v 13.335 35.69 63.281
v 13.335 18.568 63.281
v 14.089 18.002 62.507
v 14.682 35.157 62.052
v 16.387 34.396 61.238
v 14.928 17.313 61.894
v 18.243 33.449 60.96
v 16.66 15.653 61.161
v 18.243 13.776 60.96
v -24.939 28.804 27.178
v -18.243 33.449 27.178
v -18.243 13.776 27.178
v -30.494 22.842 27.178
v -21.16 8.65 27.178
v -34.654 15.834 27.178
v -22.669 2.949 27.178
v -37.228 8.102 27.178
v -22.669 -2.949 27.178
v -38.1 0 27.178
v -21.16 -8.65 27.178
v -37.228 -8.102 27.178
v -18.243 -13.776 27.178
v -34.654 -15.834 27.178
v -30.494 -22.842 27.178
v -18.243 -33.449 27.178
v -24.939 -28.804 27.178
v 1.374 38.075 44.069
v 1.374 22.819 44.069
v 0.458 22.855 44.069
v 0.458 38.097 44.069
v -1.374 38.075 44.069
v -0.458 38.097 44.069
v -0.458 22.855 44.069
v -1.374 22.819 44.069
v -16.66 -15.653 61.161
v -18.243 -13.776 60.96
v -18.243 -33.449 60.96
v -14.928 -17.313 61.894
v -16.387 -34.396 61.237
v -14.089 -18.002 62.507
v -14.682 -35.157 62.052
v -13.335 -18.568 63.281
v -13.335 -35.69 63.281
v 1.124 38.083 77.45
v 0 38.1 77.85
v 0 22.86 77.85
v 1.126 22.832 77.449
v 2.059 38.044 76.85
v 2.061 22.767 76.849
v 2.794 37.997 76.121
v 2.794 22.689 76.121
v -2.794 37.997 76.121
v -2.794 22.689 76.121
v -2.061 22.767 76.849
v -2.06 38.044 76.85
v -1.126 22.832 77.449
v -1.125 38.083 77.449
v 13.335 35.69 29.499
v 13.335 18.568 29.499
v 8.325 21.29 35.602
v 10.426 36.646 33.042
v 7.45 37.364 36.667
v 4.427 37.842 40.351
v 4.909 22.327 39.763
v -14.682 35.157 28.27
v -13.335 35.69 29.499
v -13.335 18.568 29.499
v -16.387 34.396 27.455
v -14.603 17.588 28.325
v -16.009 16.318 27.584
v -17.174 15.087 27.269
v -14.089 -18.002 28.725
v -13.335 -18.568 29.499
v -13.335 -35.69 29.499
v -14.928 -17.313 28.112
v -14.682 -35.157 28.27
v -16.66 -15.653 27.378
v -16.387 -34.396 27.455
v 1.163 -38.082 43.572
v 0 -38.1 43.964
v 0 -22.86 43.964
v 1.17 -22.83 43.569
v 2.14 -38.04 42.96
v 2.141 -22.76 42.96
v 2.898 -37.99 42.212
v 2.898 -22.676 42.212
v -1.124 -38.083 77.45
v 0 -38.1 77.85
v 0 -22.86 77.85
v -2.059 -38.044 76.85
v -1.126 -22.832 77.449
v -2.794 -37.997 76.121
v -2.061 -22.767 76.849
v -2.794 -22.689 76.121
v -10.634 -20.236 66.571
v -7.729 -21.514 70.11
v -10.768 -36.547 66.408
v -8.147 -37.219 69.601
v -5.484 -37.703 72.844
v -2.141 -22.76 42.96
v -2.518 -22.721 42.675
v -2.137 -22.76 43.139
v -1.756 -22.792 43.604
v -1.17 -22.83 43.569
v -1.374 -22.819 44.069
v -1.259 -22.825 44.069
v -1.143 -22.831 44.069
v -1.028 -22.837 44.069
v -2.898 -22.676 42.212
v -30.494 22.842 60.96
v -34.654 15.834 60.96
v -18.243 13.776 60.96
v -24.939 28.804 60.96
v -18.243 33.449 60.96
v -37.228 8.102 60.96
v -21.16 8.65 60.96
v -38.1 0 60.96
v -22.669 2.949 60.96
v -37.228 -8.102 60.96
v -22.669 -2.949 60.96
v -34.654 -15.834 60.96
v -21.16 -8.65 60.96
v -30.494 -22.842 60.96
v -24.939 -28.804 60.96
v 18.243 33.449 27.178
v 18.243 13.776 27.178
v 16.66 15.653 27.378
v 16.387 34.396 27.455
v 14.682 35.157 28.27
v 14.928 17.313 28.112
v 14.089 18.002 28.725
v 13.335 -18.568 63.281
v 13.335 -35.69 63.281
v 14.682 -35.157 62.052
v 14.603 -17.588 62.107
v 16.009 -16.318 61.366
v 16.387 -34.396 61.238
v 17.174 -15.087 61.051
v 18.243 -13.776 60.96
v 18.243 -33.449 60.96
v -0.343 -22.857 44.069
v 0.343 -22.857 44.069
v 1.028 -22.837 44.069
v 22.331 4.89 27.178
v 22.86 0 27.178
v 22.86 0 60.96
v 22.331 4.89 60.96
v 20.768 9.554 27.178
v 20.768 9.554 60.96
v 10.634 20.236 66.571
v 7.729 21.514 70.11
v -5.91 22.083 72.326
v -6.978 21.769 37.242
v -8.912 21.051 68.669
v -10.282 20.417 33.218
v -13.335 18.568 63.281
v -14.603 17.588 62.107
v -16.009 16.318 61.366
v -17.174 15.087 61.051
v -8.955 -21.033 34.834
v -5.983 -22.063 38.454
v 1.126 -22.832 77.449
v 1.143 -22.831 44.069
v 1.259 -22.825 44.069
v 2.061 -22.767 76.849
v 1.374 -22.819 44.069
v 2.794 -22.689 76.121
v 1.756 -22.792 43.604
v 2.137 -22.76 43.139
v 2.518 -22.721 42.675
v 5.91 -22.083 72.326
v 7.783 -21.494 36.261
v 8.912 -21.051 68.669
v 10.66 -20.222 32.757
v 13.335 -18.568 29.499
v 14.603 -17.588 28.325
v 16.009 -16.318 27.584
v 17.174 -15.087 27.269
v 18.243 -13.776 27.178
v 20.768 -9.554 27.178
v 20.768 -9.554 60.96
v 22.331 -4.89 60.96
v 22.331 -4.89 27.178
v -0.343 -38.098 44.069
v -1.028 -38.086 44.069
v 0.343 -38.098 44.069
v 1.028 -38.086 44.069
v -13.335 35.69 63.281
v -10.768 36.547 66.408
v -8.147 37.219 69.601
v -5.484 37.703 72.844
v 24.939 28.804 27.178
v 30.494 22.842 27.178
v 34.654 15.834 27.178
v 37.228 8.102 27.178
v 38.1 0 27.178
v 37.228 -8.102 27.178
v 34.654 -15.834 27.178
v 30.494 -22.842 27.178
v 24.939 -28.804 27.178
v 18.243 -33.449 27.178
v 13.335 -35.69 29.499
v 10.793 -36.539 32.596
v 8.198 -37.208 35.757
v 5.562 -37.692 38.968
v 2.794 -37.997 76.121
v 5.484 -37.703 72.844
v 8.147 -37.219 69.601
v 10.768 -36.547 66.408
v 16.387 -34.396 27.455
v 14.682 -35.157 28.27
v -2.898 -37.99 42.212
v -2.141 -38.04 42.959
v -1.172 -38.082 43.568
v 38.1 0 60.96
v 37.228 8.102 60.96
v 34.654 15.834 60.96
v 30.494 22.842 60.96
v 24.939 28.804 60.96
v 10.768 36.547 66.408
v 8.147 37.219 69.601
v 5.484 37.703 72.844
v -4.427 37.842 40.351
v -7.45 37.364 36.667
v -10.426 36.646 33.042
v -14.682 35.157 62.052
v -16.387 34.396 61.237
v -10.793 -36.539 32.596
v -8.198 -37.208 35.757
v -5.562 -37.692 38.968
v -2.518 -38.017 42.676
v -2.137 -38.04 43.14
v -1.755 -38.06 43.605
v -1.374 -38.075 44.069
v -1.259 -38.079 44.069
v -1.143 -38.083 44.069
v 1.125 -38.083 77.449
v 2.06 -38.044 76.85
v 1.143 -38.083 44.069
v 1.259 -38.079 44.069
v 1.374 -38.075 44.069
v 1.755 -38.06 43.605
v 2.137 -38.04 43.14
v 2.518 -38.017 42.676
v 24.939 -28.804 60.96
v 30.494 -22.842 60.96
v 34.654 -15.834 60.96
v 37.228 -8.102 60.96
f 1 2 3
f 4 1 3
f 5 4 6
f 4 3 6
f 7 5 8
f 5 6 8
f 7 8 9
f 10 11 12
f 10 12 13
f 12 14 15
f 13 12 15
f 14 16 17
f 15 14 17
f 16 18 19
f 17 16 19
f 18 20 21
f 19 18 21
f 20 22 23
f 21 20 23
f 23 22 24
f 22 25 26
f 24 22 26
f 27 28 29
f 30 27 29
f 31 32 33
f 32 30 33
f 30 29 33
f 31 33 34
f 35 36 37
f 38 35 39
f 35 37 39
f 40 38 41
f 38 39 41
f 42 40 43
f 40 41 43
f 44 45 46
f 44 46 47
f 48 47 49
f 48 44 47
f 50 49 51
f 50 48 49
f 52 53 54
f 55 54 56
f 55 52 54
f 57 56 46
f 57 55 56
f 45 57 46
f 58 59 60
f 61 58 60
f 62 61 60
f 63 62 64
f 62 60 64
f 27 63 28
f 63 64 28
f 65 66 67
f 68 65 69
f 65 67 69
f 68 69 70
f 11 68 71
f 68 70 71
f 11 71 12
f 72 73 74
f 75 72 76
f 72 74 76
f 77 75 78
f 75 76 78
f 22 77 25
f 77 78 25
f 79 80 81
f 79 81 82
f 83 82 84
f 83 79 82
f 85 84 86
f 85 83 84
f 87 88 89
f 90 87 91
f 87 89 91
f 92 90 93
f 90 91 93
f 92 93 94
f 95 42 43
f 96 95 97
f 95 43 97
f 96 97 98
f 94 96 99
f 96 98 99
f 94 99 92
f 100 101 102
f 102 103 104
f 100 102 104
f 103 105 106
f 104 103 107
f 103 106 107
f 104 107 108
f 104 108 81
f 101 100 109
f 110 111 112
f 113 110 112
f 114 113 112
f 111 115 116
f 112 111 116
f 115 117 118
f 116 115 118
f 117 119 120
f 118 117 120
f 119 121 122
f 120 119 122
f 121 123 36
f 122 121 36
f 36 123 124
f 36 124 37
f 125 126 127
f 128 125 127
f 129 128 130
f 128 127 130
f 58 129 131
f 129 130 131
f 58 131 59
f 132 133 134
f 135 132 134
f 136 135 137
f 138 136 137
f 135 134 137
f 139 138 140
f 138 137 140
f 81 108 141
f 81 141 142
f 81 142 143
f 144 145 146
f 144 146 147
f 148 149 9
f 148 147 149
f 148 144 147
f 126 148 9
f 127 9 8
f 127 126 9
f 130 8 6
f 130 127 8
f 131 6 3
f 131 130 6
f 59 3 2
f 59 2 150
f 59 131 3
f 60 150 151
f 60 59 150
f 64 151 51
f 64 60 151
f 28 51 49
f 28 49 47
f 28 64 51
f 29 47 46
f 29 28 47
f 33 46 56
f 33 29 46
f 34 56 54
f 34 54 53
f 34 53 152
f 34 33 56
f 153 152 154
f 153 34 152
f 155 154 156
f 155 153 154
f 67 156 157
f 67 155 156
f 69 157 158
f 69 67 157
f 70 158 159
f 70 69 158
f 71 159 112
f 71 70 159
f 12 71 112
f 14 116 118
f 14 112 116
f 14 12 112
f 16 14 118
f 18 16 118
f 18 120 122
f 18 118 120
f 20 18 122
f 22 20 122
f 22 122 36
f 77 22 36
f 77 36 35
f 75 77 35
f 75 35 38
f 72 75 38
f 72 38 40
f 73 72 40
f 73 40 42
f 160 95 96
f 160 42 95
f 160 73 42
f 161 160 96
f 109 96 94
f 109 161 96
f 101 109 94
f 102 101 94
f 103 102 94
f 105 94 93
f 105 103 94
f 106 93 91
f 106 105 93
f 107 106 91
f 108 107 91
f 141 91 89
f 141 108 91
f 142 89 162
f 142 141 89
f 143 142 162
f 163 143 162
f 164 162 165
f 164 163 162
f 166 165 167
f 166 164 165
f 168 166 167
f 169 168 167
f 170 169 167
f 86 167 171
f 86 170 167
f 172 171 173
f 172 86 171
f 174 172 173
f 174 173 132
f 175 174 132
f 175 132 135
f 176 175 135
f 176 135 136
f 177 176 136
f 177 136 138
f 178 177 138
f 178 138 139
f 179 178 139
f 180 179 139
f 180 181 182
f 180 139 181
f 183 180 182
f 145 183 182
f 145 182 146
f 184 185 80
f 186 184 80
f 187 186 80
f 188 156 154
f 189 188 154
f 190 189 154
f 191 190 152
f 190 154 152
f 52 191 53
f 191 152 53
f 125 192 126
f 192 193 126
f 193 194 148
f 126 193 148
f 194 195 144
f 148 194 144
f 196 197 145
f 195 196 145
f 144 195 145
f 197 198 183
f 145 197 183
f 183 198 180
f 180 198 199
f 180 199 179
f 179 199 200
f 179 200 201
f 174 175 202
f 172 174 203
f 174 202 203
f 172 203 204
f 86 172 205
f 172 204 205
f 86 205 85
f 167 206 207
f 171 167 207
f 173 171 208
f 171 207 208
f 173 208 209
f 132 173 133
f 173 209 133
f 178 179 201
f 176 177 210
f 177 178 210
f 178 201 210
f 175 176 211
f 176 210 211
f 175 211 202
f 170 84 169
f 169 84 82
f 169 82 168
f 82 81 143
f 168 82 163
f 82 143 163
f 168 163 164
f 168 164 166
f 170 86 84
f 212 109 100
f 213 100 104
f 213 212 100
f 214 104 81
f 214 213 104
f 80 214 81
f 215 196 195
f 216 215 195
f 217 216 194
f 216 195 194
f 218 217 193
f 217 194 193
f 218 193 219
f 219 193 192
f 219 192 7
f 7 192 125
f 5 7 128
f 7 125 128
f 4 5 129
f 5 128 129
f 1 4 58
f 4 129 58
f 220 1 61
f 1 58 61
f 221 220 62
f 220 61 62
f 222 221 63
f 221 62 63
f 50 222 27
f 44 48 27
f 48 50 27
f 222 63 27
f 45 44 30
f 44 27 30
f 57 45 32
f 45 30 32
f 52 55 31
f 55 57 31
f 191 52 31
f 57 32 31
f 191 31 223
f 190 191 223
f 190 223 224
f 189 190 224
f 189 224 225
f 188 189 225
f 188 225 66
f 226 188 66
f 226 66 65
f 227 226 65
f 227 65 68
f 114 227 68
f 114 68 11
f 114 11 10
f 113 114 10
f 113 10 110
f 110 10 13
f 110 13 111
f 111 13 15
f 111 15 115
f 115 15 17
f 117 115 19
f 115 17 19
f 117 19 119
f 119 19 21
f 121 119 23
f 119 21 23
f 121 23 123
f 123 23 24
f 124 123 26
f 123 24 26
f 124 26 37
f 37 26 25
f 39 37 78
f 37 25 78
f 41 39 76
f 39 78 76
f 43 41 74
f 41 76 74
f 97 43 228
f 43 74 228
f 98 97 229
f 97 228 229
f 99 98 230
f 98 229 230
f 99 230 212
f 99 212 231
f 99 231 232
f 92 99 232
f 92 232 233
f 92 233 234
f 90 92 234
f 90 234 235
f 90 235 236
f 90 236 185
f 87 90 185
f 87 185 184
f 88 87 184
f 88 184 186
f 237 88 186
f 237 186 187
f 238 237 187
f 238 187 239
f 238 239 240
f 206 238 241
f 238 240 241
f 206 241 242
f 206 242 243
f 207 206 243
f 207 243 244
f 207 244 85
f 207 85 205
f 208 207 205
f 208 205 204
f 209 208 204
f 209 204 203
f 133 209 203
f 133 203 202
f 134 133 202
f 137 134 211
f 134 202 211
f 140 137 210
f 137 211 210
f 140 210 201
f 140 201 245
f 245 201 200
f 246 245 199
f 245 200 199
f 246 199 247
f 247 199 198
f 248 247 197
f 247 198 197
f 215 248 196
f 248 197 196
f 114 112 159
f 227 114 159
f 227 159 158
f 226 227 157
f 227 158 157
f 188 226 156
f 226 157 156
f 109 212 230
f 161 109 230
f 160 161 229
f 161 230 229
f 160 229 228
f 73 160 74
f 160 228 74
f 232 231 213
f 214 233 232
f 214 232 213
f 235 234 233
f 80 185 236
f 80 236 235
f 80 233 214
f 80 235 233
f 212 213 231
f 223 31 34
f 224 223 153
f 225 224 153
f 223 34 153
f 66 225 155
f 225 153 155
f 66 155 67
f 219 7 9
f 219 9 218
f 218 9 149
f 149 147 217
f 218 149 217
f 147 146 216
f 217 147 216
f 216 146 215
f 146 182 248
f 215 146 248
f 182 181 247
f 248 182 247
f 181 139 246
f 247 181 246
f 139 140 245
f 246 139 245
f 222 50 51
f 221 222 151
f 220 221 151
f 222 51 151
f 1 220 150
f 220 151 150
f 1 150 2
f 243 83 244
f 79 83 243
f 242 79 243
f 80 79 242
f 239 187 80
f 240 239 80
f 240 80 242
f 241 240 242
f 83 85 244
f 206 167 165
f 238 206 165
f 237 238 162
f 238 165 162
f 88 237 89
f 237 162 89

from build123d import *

# Parameters (mm, degrees)
F0_R         = 38.1
F0_R_2       = 22.86
F1_DEPTH     = 127
F4_DEPTH     = 80.011
F5_T4_DEPTH  = 27.2677982704
F5_S5_R      = 38.1
F5_T6_DEPTH  = 15
F5_S7_R      = 22.86
F5_T8_DEPTH  = 15
F5_T12_DEPTH = 27.2677982704
F5_S13_R     = 38.1
F5_T14_DEPTH = 15
F5_S15_R     = 22.86
F5_T16_DEPTH = 15
F5_T17_DEPTH = 27.2653813946
F5_T19_DEPTH = 27.2653813946


# Not quite as in the source:
# - a fillet or chamfer that OpenCascade refuses, or shapes differently, is made with other operations: its cross-section is extruded or revolved along the edge and cut away or added


with BuildPart() as f1:
    # F0 (on Top) → F1 (new body)
    with BuildSketch(Plane.XY):
        Circle(F0_R)
        Circle(F0_R_2, mode=Mode.SUBTRACT)
    extrude(amount=F1_DEPTH)

    # F3 (on offset) → F4 (cut, through all)
    with BuildSketch(Plane.XZ.offset(41.91)):
        with BuildLine():
            Line((1.3741332924, 44.0691516455), (0, 44.0691516455))
            Line((0, 44.0691516455), (0, 27.1781024958))
            Line((0, 27.1781024958), (0, -6.6039958037))
            Line((0, -6.6039958037), (38.1, -6.6039958037))
            Line((38.1, -6.6039958037), (38.1, 27.1781024958))
            Line((38.1, 27.1781024958), (18.242812226, 27.1781024958))
            ThreePointArc((18.242812226, 27.1781024958), (15.5282171859, 27.7875908663), (13.3347289514, 29.4990556395))
            Line((13.3347289514, 29.4990556395), (1.3741332924, 44.0691516455))
        make_face()
        with BuildLine():
            Line((0, 44.0691516455), (-1.3741332924, 44.0691516455))
            Line((-1.3741332924, 44.0691516455), (-13.3347289514, 29.4990556395))
            ThreePointArc((-13.3347289514, 29.4990556395), (-15.5282171859, 27.7875908663), (-18.242812226, 27.1781024958))
            Line((-18.242812226, 27.1781024958), (-38.1, 27.1781024958))
            Line((-38.1, 27.1781024958), (-38.1, -6.6039958037))
            Line((-38.1, -6.6039958037), (0, -6.6039958037))
            Line((0, -6.6039958037), (0, 27.1781024958))
            Line((0, 27.1781024958), (0, 44.0691516455))
        make_face()
        with BuildLine():
            Line((38.1, 60.9602007953), (38.1, 77.9781024958))
            Line((38.1, 77.9781024958), (1.27, 77.9781024958))
            Line((1.27, 77.9781024958), (1.2895432809, 77.9542953638))
            Line((1.2895432809, 77.9542953638), (13.3347289514, 63.281153939))
            ThreePointArc((13.3347289514, 63.281153939), (15.5282171859, 61.5696891658), (18.242812226, 60.9602007953))
            Line((18.242812226, 60.9602007953), (38.1, 60.9602007953))
        make_face()
        with BuildLine():
            Line((-38.1, 77.9781024958), (-38.1, 60.9602007953))
            Line((-38.1, 60.9602007953), (-18.242812226, 60.9602007953))
            ThreePointArc((-18.242812226, 60.9602007953), (-15.5282171859, 61.5696891658), (-13.3347289514, 63.281153939))
            Line((-13.3347289514, 63.281153939), (-1.2895432809, 77.9542953638))
            Line((-1.2895432809, 77.9542953638), (-1.27, 77.9781024958))
            Line((-1.27, 77.9781024958), (-38.1, 77.9781024958))
        make_face()
        Polygon((-38.1, 131.2988996506), (-38.1, 77.9781024958), (-1.27, 77.9781024958), (-1.2391987117, 77.9781024958), (-0.1262114529, 77.9781024958), (0, 77.9781024958), (1.2391987117, 77.9781024958), (1.27, 77.9781024958), (38.1, 77.9781024958), (38.1, 80.6030047561), (38.1, 131.2988996506), align=None)
    extrude(amount=-F4_DEPTH, mode=Mode.SUBTRACT)

    # F5: fillet of radius 5.08 on 6 edges, made by hand


with BuildPart() as f5_tool2:
    # F5_s3 → F5_t4 (new body)
    with BuildSketch(Plane.XZ.offset(44.0808363055)):
        with BuildLine():
            ThreePointArc((-1.0281164884, 44.0691516455), (1.1435595437, 43.5815609491), (2.8983501313, 42.2123891305))
            Line((2.8983501313, 42.2123891305), (1.3741332924, 44.0691516455))
            Line((1.3741332924, 44.0691516455), (-1.0281164884, 44.0691516455))
        make_face()
    extrude(amount=-F5_T4_DEPTH)

    # F5_s5 → F5_t6 (intersect, symmetric)
    with BuildSketch(Plane.XY.offset(43.1)):
        Circle(F5_S5_R)
    extrude(amount=F5_T6_DEPTH, both=True, mode=Mode.INTERSECT)

    # F5_s7 → F5_t8 (cut, symmetric)
    with BuildSketch(Plane.XY.offset(43.1)):
        Circle(F5_S7_R)
    extrude(amount=F5_T8_DEPTH, both=True, mode=Mode.SUBTRACT)


with BuildPart() as f1_1:
    add(f1.part)

    # F5_t1: union F5_tool2
    add(f5_tool2.part)


with BuildPart() as f5_tool10:
    # F5_s11 → F5_t12 (new body)
    with BuildSketch(Plane.XZ.offset(44.0808363055)):
        with BuildLine():
            ThreePointArc((-2.8983501313, 42.2123891305), (-1.1435595437, 43.5815609491), (1.0281164884, 44.0691516455))
            Line((1.0281164884, 44.0691516455), (-1.3741332924, 44.0691516455))
            Line((-1.3741332924, 44.0691516455), (-2.8983501313, 42.2123891305))
        make_face()
    extrude(amount=-F5_T12_DEPTH)

    # F5_s13 → F5_t14 (intersect, symmetric)
    with BuildSketch(Plane.XY.offset(43.1)):
        Circle(F5_S13_R)
    extrude(amount=F5_T14_DEPTH, both=True, mode=Mode.INTERSECT)

    # F5_s15 → F5_t16 (cut, symmetric)
    with BuildSketch(Plane.XY.offset(43.1)):
        Circle(F5_S15_R)
    extrude(amount=F5_T16_DEPTH, both=True, mode=Mode.SUBTRACT)


with BuildPart() as f1_2:
    add(f1_1.part)

    # F5_t9: union F5_tool10
    add(f5_tool10.part)

    # F5_s18 → F5_t17 (cut)
    with BuildSketch(Plane.XZ.offset(16.8190705077)):
        with BuildLine():
            ThreePointArc((2.7942168389, 76.1213399807), (1.0394262513, 77.4905117994), (-1.1322497808, 77.9781024958))
            Line((-1.1322497808, 77.9781024958), (1.27, 77.9781024958))
            Line((1.27, 77.9781024958), (2.7942168389, 76.1213399807))
        make_face()
        with BuildLine():
            ThreePointArc((1.1322497808, 77.9781024958), (-1.0394262513, 77.4905117994), (-2.7942168389, 76.1213399807))
            Line((-2.7942168389, 76.1213399807), (-1.27, 77.9781024958))
            Line((-1.27, 77.9781024958), (1.1322497808, 77.9781024958))
        make_face()
    extrude(amount=F5_T17_DEPTH, mode=Mode.SUBTRACT)

    # F5_s20 → F5_t19 (cut)
    with BuildSketch(Plane.XZ.offset(-44.0844519023)):
        with BuildLine():
            ThreePointArc((-1.1322497808, 77.9781024958), (1.0394262513, 77.4905117994), (2.7942168389, 76.1213399807))
            Line((2.7942168389, 76.1213399807), (1.27, 77.9781024958))
            Line((1.27, 77.9781024958), (-1.1322497808, 77.9781024958))
        make_face()
        with BuildLine():
            ThreePointArc((-2.7942168389, 76.1213399807), (-1.0394262513, 77.4905117994), (1.1322497808, 77.9781024958))
            Line((1.1322497808, 77.9781024958), (-1.27, 77.9781024958))
            Line((-1.27, 77.9781024958), (-2.7942168389, 76.1213399807))
        make_face()
    extrude(amount=F5_T19_DEPTH, mode=Mode.SUBTRACT)


solid = f1_2.part
